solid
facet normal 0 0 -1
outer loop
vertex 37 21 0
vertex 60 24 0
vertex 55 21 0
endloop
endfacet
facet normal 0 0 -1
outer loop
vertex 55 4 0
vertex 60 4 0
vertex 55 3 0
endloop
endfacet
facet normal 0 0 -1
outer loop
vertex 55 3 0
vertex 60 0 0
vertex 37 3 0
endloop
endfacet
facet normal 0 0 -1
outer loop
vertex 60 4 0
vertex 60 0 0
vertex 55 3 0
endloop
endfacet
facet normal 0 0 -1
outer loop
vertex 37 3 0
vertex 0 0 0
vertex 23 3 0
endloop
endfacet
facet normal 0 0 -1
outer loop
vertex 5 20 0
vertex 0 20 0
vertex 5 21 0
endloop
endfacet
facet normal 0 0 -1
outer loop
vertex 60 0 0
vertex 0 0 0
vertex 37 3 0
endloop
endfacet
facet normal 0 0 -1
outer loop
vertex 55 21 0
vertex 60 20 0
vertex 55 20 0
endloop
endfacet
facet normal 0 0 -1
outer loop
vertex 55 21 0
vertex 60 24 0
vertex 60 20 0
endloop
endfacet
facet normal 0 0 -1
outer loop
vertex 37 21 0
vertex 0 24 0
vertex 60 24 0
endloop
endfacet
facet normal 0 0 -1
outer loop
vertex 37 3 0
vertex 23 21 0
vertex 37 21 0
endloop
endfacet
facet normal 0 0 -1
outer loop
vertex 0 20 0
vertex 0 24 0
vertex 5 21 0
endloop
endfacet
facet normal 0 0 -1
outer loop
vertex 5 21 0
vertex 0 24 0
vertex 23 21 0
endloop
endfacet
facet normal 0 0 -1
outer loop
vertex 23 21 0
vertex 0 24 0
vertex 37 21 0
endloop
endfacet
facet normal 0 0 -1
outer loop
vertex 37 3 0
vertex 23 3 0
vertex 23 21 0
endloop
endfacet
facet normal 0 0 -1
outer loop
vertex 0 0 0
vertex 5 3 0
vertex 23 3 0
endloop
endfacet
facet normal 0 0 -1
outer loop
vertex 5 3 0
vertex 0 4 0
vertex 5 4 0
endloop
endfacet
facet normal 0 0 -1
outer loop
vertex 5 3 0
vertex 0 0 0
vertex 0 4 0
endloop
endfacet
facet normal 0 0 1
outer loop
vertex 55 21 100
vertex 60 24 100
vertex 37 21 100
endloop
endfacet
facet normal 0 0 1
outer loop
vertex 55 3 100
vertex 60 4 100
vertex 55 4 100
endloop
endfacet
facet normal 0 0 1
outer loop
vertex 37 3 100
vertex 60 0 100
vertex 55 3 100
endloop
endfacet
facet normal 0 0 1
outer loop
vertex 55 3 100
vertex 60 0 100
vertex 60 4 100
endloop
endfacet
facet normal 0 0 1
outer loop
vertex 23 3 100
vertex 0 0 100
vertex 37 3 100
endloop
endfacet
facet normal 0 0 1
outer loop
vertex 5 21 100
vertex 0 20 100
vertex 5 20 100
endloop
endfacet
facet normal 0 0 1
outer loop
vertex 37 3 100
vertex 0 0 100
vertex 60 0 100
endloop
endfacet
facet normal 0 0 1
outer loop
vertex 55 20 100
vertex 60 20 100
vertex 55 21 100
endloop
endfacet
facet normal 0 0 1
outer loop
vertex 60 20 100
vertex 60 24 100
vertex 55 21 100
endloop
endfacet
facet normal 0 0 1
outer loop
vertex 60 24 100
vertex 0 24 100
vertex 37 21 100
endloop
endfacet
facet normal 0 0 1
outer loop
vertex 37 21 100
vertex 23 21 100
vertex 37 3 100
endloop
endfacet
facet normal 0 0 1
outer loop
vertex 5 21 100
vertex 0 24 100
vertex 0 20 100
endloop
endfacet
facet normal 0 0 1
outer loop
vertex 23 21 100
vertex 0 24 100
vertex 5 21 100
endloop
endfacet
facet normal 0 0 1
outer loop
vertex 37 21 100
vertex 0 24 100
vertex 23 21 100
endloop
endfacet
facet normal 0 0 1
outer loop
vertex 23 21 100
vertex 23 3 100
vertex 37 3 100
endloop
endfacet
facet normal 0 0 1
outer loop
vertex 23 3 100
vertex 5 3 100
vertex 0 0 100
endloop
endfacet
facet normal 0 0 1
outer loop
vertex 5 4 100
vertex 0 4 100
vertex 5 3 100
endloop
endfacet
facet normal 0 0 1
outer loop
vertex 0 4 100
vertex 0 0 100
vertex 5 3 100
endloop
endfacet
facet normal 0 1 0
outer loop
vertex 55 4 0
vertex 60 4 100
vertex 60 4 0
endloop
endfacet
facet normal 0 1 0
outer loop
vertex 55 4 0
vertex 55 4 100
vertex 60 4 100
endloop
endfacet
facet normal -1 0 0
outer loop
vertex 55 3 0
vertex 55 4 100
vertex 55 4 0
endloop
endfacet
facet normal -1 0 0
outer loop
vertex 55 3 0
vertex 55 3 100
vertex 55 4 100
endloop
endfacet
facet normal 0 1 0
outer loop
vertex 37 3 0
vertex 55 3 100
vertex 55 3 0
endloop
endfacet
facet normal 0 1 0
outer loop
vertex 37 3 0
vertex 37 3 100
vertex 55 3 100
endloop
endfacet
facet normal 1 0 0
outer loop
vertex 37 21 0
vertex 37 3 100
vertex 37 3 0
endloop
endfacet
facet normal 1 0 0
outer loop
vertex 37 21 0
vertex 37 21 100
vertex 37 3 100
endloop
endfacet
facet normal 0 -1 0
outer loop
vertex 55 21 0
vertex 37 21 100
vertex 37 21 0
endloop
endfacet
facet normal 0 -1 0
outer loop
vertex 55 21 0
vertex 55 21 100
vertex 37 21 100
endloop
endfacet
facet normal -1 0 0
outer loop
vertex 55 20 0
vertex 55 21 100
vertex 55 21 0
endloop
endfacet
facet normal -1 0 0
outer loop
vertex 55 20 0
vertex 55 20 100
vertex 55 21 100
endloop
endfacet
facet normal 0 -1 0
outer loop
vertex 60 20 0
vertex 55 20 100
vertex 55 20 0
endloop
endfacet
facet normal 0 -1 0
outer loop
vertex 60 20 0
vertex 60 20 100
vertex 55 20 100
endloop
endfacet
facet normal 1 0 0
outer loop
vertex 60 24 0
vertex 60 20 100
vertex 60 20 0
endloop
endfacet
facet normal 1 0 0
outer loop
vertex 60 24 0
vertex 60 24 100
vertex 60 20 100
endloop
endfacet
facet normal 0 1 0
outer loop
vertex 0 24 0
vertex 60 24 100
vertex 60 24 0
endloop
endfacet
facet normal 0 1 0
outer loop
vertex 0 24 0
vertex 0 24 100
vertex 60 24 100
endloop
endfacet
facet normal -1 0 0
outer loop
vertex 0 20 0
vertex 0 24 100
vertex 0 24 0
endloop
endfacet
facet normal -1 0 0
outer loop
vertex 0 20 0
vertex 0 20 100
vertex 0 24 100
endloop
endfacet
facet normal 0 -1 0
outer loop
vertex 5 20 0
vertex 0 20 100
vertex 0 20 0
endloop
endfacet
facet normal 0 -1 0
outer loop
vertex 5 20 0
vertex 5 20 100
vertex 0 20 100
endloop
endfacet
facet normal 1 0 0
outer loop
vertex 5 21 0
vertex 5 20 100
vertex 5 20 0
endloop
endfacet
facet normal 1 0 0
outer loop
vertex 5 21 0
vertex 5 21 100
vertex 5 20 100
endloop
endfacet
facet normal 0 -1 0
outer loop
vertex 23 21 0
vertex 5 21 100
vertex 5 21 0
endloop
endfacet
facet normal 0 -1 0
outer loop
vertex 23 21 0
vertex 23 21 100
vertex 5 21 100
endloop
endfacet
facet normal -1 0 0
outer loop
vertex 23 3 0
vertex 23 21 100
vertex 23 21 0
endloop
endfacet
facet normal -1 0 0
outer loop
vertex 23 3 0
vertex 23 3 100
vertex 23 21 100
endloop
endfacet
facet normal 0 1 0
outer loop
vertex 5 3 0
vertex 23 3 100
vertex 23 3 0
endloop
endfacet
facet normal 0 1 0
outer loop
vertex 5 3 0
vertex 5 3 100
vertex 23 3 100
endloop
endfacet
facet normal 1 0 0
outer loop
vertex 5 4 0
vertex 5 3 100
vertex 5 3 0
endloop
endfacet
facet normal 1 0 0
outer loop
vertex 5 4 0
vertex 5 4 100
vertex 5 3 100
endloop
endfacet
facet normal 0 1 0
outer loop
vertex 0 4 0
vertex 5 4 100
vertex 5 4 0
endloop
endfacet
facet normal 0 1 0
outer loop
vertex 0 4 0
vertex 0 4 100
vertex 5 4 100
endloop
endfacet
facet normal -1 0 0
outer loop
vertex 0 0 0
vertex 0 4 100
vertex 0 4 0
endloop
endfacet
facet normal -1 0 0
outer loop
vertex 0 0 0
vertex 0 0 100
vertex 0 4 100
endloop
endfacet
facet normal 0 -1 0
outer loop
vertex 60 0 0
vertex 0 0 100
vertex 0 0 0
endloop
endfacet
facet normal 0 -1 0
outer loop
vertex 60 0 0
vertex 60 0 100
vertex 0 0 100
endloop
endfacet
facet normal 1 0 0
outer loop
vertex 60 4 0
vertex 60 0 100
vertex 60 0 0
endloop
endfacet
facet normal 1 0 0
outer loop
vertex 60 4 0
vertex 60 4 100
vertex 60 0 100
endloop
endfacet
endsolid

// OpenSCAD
$fn = 32;

// ----------------------------------------------------------------------
// T-slot rail: 60 x 24 mm section, 100 mm long
// ----------------------------------------------------------------------

// --- parameters (mm) ---
profile_height = 100;     // extrusion height
profile_points = 20;      // points of the closed outline

profile = [[0, 0], [60, 0], [60, 4], [55, 4], [55, 3], [37, 3], [37, 21], [55, 21], [55, 20], [60, 20], [60, 24], [0, 24], [0, 20], [5, 20], [5, 21], [23, 21], [23, 3], [5, 3], [5, 4], [0, 4]];  // single closed polygon, 20 points, counter clockwise

// --- the one profile operation ---
linear_extrude(height = profile_height) polygon(points = profile);
